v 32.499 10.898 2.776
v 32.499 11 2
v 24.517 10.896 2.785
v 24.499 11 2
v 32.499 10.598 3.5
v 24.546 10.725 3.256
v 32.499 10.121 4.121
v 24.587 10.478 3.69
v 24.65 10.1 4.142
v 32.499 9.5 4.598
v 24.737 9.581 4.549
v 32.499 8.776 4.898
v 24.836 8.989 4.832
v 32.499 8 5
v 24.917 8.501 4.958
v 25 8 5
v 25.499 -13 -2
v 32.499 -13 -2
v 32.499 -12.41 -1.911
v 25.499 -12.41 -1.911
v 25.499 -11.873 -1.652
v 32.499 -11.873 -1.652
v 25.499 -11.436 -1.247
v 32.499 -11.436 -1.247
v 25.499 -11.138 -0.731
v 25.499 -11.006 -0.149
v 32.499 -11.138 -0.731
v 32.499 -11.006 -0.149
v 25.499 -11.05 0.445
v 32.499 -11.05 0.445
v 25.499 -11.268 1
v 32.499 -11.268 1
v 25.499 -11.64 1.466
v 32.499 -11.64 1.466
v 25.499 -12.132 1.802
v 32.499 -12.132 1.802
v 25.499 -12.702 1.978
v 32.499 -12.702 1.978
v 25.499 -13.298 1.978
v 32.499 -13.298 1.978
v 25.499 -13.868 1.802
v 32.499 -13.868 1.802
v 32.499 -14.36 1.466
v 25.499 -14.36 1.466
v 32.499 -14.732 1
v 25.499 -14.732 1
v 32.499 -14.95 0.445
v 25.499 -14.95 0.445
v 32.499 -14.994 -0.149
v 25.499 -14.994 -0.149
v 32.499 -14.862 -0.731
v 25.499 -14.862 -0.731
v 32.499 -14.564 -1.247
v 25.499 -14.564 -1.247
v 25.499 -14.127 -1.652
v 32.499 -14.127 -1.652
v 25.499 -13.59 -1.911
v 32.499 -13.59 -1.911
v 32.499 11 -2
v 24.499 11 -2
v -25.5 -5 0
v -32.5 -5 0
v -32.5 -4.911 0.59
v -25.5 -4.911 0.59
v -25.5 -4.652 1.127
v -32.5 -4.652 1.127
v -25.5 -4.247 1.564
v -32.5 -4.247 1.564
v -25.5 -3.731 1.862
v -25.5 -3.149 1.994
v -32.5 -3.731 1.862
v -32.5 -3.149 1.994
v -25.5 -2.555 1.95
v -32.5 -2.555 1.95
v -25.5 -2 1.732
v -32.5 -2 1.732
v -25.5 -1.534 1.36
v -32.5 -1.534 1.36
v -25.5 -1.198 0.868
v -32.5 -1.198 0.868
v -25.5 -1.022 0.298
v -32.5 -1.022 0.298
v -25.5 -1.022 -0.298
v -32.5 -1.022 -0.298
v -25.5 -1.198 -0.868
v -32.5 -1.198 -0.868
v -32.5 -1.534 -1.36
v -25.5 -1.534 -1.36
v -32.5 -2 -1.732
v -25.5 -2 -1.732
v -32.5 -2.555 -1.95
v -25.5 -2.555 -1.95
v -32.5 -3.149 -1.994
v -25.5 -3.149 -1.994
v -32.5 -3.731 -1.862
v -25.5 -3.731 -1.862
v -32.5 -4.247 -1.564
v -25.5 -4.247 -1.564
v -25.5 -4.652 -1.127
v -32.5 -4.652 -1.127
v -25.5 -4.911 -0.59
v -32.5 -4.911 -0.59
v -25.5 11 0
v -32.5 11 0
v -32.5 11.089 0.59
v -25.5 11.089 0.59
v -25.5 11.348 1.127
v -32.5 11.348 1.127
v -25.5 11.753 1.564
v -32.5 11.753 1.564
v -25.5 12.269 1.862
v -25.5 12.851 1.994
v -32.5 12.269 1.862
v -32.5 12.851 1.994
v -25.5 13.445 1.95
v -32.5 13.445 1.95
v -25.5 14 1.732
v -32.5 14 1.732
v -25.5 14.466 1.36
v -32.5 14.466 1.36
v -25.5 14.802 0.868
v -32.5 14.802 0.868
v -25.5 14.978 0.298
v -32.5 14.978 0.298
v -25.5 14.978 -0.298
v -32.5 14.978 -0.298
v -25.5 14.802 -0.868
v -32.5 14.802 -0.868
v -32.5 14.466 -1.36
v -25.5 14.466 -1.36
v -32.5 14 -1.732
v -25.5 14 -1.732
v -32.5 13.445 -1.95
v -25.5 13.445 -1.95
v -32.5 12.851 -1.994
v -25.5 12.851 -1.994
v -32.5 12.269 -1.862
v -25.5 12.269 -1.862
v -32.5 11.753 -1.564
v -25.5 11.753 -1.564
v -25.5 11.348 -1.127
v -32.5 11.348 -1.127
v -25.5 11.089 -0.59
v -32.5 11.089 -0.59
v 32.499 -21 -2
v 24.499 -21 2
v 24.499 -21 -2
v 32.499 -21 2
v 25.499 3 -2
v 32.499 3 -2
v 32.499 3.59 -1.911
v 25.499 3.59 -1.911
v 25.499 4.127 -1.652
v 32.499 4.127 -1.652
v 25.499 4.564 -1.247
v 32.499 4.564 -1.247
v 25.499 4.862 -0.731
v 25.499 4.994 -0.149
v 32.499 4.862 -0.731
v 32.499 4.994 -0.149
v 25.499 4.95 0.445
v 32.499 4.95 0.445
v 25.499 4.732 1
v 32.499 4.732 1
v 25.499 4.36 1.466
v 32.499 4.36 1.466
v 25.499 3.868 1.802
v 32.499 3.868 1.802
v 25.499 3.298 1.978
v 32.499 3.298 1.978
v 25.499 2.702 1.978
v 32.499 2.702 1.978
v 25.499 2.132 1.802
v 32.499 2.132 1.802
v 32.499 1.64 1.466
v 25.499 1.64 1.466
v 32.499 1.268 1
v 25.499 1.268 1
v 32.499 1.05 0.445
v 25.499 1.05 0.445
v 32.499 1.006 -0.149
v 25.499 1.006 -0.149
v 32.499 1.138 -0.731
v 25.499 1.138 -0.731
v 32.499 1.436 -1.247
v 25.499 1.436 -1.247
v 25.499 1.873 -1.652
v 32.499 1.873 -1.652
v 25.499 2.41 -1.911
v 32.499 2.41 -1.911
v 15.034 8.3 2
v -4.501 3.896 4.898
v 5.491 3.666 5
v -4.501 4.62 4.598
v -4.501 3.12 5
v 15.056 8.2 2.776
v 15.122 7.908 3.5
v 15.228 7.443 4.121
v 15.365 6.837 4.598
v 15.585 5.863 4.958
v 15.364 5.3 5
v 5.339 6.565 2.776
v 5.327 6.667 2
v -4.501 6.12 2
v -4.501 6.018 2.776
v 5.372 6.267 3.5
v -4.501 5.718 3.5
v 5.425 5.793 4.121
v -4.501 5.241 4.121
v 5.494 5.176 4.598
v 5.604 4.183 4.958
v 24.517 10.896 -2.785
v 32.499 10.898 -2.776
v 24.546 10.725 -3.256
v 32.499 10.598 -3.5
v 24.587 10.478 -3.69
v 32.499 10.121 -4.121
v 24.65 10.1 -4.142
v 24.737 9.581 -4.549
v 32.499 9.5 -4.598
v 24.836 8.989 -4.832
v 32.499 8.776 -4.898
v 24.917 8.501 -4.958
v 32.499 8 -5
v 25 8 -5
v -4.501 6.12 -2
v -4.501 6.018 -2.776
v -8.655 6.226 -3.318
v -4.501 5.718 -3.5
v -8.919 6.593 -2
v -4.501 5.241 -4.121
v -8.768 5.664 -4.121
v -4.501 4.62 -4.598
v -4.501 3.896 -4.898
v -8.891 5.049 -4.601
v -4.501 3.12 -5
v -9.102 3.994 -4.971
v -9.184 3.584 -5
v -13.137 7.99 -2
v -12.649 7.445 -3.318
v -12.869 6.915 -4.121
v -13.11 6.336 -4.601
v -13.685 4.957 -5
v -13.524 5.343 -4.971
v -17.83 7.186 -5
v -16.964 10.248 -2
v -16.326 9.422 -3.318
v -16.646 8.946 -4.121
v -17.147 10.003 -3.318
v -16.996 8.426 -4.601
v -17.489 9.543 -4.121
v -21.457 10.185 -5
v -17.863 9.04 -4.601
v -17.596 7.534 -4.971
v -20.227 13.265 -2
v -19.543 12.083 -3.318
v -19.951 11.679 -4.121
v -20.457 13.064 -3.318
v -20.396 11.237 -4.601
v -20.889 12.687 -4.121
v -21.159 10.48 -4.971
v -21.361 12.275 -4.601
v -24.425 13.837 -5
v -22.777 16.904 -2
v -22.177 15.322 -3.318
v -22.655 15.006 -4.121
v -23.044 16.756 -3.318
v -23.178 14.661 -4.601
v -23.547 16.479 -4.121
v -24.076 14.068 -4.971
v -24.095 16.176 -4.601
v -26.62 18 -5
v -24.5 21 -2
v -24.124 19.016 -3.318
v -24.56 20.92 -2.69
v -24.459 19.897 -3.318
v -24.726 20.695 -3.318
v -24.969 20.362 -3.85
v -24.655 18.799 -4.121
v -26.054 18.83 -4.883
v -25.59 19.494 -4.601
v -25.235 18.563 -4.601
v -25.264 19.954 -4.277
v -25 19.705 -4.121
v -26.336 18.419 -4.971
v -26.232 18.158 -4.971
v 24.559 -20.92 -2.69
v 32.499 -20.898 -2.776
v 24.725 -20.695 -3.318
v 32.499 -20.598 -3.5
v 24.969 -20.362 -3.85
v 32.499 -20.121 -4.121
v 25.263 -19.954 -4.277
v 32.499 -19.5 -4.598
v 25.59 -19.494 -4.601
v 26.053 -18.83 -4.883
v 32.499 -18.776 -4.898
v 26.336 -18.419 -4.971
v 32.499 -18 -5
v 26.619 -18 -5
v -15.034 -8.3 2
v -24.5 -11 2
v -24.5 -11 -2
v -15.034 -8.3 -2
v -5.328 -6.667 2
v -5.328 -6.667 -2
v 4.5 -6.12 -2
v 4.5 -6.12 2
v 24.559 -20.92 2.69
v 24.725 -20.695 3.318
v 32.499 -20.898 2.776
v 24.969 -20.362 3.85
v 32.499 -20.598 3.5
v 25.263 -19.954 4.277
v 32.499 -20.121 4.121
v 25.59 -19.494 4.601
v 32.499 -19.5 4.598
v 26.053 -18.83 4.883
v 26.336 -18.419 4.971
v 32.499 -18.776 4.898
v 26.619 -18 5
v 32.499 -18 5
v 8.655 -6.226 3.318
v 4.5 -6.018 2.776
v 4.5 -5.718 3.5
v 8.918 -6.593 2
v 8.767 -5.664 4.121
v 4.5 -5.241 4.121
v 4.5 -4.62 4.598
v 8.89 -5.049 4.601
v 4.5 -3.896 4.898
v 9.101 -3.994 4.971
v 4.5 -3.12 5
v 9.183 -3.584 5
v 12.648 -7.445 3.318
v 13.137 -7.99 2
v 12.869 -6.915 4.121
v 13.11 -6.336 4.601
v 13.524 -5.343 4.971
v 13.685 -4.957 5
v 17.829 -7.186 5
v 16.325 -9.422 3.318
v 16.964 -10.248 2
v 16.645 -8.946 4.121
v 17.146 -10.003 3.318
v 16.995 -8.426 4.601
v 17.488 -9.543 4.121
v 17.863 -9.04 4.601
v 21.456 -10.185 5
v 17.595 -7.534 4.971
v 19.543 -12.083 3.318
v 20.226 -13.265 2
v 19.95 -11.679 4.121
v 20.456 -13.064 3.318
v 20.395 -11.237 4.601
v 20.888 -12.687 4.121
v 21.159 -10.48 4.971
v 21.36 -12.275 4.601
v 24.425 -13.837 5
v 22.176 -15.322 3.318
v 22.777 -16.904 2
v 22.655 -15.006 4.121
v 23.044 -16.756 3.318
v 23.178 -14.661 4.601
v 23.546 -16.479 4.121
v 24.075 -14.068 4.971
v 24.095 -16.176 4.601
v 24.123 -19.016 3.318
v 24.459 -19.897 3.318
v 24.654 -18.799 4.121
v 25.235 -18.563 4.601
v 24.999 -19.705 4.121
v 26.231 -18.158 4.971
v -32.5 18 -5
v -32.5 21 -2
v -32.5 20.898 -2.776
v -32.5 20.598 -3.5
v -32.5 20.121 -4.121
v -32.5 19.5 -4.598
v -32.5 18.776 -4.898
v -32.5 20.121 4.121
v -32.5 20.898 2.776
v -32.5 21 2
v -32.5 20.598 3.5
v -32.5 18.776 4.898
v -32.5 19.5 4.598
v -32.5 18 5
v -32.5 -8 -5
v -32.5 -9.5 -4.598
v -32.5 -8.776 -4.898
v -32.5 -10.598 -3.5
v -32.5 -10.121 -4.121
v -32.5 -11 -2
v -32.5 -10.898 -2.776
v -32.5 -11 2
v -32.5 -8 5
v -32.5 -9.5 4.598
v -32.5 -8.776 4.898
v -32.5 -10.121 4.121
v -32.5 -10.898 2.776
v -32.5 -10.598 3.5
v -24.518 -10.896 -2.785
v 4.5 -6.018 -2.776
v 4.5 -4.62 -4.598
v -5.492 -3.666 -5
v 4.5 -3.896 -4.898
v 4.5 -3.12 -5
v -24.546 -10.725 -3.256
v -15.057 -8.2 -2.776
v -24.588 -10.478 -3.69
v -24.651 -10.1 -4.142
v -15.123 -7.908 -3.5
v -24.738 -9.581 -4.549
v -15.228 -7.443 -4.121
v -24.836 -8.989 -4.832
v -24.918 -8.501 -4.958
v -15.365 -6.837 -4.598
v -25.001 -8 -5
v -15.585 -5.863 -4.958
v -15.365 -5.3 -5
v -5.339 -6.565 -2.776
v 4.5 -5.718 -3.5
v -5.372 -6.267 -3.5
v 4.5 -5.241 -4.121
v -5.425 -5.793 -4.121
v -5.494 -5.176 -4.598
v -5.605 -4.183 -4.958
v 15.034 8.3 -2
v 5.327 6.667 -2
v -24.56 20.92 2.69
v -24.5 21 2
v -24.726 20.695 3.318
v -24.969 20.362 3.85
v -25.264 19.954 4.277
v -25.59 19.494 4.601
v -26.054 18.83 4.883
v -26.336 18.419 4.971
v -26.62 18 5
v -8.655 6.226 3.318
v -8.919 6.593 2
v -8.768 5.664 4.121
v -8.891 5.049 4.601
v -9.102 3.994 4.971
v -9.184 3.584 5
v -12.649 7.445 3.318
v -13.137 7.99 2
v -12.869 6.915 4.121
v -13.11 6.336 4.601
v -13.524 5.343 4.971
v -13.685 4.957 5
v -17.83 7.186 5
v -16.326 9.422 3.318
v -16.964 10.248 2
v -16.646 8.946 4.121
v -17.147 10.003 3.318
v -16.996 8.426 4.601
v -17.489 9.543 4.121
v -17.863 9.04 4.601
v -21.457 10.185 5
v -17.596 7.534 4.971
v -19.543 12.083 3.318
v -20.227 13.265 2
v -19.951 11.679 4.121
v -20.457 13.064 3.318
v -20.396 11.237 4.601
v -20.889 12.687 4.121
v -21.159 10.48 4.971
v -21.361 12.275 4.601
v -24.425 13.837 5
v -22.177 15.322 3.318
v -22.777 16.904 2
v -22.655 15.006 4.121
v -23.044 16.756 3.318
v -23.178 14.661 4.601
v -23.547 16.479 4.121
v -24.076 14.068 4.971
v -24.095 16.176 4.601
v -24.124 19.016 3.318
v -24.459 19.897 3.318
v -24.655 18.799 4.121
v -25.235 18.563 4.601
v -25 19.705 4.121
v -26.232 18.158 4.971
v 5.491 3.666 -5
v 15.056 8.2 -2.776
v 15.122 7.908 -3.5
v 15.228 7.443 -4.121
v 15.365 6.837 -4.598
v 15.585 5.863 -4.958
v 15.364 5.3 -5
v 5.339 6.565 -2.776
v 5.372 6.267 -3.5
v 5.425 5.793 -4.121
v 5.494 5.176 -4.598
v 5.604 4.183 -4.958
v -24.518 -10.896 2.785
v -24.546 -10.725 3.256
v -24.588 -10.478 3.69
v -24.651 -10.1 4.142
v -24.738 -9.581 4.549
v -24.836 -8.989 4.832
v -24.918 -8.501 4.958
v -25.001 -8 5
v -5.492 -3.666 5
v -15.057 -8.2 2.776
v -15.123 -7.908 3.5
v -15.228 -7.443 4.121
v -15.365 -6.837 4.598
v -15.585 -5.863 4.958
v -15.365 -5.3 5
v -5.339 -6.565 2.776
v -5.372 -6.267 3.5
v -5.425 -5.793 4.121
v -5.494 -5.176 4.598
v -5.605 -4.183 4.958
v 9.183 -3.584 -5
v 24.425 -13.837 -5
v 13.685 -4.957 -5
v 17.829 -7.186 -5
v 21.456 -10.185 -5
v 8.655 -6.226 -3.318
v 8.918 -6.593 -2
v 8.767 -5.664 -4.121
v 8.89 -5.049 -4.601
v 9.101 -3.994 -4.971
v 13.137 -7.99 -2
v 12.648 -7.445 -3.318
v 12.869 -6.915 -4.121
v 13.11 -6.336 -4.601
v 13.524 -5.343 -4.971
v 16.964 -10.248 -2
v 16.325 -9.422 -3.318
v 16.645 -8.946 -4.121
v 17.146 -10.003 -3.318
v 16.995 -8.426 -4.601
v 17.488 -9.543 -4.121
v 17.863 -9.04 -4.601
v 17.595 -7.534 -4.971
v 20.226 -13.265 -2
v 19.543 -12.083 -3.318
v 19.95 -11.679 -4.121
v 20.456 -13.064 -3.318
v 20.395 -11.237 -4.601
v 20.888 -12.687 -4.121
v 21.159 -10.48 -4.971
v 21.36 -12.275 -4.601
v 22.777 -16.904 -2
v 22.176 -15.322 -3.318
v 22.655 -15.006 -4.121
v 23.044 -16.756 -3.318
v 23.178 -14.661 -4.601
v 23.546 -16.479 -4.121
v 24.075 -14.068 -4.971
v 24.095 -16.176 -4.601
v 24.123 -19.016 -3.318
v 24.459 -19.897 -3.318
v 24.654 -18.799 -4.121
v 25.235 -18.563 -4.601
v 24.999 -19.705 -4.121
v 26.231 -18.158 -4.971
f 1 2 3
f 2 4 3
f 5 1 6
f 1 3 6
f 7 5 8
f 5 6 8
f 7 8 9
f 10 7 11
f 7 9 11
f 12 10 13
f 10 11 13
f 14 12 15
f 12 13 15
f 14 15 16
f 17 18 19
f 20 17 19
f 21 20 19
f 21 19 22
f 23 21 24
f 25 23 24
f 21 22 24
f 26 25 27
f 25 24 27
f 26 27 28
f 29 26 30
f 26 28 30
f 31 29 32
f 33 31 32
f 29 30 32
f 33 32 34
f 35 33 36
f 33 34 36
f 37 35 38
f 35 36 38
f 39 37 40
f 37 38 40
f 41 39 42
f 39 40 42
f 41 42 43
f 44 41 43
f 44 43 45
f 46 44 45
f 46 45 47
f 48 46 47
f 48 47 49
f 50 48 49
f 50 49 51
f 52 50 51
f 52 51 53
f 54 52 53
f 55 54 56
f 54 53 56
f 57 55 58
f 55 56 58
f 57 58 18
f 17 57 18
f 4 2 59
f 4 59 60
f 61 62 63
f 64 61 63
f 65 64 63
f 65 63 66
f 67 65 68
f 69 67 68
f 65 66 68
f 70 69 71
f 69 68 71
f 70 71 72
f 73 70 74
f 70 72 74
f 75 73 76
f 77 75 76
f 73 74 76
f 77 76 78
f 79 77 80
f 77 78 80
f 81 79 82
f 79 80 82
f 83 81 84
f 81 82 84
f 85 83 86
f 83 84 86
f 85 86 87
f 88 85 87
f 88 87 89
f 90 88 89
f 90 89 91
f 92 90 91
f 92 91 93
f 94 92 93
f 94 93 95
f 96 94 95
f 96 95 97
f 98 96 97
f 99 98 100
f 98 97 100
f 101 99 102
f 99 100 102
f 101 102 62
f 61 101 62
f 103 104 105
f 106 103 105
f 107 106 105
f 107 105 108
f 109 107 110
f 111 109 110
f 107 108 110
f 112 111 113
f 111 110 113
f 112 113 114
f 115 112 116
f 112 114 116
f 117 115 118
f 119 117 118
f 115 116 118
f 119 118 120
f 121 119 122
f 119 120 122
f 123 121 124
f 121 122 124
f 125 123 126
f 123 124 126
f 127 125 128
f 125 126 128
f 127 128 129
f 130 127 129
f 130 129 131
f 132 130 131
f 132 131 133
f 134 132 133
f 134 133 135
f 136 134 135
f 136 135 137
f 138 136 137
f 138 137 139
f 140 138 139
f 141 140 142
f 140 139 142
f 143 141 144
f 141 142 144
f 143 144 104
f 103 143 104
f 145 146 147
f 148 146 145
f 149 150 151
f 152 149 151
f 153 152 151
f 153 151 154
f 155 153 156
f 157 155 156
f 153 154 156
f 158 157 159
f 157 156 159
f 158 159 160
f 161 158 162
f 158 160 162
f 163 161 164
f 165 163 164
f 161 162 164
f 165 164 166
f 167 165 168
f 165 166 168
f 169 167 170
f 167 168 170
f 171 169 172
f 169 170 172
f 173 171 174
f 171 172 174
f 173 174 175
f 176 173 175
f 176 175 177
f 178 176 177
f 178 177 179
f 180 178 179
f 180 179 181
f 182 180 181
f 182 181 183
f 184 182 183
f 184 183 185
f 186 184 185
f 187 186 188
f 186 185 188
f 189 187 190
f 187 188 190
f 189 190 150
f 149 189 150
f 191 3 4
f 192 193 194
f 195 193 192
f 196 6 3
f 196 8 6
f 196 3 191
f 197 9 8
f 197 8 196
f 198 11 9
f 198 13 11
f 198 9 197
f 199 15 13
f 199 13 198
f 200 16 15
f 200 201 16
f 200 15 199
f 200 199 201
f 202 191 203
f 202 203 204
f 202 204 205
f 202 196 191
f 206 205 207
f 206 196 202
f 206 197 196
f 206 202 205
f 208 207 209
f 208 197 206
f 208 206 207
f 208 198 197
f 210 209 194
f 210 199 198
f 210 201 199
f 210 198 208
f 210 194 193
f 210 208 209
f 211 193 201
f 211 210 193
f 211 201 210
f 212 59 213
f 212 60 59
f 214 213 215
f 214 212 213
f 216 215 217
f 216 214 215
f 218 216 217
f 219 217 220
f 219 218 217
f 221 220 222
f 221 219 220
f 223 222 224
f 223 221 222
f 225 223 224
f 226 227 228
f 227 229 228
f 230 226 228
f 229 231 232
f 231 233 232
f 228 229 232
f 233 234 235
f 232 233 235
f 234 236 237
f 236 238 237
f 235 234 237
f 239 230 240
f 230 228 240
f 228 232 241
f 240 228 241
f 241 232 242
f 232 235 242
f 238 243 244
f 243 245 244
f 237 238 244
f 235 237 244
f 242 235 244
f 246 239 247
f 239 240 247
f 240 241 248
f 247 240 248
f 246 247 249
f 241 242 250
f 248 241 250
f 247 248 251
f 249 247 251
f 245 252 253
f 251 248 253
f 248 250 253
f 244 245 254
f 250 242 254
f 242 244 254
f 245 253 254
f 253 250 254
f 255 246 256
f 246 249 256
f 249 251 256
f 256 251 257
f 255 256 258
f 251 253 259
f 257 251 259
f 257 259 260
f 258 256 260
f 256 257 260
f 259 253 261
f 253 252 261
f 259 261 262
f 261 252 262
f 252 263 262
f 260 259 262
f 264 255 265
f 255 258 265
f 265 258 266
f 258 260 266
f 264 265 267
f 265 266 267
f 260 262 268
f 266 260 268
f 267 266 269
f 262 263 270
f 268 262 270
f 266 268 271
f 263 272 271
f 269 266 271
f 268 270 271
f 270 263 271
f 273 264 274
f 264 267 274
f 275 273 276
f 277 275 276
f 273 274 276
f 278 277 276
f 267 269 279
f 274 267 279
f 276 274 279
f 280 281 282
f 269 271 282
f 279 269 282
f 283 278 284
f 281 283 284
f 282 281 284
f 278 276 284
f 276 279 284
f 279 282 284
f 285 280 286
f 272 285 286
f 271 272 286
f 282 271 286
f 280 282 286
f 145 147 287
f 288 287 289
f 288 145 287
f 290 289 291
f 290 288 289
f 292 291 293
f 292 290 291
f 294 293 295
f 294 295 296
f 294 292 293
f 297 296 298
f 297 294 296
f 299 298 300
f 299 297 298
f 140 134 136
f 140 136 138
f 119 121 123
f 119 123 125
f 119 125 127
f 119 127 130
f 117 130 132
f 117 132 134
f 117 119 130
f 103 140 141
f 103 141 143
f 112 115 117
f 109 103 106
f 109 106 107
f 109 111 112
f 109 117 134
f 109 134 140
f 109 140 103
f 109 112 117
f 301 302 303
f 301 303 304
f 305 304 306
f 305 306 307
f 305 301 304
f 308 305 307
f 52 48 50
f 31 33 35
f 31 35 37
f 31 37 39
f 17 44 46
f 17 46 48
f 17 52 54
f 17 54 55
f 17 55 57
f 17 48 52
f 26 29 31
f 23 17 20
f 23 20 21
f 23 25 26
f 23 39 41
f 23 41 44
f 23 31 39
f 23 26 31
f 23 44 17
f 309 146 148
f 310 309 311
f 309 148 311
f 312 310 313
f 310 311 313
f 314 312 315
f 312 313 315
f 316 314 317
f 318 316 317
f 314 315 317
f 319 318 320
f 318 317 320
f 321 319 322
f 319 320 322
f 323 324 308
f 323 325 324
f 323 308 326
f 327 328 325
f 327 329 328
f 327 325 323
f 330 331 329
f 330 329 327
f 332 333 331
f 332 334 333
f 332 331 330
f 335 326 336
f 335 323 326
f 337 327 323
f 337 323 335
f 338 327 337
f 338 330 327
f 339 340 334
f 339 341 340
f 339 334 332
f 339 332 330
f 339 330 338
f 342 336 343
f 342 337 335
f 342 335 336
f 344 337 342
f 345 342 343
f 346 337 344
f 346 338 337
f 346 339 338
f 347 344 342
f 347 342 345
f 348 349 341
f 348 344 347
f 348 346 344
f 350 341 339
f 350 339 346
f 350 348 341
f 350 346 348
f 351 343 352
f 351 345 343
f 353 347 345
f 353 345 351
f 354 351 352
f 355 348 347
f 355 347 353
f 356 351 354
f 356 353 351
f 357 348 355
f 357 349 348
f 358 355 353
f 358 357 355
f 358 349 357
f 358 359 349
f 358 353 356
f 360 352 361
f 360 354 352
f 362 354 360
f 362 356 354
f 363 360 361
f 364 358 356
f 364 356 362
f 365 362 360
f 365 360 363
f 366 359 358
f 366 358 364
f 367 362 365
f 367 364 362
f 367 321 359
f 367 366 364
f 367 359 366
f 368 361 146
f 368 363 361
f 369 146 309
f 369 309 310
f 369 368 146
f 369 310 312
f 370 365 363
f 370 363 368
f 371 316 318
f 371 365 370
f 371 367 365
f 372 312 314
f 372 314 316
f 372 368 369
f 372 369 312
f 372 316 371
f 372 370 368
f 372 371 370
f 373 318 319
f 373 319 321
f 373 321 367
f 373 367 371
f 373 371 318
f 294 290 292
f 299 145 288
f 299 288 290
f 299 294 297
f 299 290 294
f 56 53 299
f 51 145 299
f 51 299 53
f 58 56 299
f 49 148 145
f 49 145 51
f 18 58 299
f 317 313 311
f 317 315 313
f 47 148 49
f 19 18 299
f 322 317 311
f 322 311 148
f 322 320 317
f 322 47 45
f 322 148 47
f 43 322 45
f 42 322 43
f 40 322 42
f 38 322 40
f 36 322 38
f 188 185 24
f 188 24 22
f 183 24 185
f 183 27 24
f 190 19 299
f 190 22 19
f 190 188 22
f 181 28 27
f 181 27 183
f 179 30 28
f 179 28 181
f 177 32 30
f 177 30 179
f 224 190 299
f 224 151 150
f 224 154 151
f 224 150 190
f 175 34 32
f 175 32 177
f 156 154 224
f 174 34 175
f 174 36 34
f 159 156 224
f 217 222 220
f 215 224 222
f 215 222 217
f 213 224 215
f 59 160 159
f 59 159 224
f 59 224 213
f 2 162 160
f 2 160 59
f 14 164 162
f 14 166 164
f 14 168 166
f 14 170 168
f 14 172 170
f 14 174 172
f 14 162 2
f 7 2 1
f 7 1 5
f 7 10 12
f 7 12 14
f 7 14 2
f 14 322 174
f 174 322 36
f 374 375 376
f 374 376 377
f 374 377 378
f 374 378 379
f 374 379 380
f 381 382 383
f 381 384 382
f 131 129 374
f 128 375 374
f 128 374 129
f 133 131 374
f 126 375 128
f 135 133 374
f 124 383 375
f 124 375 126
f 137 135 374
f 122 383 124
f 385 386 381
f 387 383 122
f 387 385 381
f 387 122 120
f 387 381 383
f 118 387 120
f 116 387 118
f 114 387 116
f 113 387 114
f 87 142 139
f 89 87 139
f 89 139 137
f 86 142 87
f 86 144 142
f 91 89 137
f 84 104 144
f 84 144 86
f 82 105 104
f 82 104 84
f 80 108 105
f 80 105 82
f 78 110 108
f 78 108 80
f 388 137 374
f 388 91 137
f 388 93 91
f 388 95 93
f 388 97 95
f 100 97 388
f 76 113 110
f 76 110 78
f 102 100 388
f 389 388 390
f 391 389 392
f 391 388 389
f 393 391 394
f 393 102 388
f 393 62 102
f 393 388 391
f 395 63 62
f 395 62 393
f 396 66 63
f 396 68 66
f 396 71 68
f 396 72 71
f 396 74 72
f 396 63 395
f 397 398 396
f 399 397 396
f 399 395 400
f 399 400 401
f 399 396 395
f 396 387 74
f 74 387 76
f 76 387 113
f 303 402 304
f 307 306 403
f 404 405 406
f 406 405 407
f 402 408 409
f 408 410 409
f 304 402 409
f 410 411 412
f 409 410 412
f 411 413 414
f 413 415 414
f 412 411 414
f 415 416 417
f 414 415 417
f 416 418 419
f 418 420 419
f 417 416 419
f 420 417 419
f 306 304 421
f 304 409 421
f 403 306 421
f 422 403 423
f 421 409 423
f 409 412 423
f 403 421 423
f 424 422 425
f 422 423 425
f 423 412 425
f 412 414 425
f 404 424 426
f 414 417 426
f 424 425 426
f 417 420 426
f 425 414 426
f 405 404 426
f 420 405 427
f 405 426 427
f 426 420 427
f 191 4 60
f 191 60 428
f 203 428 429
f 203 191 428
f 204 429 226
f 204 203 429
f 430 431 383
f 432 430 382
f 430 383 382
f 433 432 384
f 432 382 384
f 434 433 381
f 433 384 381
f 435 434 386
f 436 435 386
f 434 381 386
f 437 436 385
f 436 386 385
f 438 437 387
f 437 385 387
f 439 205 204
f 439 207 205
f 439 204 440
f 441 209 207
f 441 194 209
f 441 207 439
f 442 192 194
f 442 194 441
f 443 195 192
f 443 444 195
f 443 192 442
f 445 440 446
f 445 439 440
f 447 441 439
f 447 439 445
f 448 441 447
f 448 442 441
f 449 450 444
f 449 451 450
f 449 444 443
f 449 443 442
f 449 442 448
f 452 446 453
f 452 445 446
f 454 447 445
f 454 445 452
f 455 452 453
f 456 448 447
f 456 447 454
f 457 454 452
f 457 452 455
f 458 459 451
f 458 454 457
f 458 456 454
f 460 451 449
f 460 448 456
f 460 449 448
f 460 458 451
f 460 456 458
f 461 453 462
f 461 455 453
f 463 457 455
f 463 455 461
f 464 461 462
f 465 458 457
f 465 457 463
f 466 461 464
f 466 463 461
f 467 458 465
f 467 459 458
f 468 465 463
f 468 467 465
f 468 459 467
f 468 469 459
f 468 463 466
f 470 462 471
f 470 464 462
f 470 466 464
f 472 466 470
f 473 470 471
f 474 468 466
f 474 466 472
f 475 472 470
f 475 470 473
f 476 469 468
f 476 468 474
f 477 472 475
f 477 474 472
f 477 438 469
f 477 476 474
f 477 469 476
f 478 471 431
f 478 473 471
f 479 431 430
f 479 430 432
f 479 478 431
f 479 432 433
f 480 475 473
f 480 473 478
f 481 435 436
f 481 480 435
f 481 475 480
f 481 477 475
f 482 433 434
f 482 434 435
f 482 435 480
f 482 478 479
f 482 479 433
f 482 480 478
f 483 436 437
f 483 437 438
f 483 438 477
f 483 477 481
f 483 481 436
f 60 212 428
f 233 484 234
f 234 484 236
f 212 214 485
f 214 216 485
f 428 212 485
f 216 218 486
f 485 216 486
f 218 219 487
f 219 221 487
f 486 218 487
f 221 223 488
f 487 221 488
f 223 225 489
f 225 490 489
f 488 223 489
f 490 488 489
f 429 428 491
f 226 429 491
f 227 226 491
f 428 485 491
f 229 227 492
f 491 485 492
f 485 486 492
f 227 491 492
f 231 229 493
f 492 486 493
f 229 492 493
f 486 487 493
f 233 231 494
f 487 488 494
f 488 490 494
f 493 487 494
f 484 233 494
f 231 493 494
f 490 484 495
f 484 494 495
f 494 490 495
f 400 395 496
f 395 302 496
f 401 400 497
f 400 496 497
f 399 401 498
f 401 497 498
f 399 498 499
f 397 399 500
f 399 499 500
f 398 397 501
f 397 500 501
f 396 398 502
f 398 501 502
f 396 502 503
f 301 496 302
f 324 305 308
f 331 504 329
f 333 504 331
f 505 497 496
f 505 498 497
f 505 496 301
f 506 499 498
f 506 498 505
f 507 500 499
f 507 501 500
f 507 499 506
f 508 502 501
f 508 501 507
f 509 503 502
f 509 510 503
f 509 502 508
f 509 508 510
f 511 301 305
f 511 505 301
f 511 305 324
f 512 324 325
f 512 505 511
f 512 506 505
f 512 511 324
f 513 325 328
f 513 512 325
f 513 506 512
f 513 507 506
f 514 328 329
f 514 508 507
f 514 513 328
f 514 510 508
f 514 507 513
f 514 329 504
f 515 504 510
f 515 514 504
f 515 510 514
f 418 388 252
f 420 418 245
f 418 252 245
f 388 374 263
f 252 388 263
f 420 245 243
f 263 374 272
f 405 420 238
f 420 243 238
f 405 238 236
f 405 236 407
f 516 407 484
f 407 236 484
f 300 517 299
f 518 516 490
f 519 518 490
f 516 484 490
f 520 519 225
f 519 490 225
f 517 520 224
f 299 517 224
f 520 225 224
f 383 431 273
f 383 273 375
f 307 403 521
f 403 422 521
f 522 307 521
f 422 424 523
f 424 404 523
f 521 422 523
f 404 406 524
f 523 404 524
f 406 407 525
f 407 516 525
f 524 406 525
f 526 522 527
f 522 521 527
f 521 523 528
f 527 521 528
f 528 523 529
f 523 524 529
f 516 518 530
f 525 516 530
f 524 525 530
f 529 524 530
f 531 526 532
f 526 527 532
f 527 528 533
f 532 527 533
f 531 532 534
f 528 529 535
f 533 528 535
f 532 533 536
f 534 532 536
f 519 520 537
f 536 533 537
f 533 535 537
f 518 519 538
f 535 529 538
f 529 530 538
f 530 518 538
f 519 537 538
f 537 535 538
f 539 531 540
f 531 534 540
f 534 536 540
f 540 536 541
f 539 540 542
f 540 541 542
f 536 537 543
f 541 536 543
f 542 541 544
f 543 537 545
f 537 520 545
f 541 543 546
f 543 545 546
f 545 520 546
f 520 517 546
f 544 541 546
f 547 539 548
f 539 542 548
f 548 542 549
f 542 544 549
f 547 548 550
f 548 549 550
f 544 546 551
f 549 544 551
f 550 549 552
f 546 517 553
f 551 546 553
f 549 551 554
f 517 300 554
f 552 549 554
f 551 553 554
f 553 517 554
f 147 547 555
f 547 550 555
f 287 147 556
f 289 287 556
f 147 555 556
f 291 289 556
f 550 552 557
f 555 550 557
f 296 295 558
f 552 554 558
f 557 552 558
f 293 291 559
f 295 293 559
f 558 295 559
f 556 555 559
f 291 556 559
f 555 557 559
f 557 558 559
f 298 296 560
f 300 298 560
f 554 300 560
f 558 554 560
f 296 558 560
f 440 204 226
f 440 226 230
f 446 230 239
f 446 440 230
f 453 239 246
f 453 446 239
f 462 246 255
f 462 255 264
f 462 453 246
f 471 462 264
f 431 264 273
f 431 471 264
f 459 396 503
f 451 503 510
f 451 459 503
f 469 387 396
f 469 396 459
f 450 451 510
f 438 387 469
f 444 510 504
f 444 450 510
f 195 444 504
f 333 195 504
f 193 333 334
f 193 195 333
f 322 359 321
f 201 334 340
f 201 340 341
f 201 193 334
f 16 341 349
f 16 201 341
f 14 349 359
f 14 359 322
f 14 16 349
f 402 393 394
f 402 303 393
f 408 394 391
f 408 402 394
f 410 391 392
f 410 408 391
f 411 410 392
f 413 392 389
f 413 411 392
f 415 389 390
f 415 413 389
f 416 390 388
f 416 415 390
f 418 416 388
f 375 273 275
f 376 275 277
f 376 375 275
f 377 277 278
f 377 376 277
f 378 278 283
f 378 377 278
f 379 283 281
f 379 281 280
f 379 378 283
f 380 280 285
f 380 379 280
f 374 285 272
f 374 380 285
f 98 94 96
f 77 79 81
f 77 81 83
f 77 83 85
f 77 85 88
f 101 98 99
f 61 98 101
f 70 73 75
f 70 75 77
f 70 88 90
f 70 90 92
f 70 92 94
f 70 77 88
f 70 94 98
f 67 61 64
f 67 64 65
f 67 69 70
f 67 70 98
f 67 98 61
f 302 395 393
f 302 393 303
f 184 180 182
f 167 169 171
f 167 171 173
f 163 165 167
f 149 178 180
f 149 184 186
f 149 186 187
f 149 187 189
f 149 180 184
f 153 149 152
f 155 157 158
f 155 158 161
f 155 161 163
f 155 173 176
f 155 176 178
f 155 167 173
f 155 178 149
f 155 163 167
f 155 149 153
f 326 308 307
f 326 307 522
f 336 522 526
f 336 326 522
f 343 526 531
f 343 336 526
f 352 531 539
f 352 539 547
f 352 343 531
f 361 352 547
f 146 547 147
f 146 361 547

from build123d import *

# Parameters (mm, degrees)
BOSS_EXTRUDE1_DEPTH = 5
FILLET1_R           = 3
SKETCH2_R           = 2
CUT_EXTRUDE1_DEPTH  = 7
SKETCH3_R           = 2
CUT_EXTRUDE2_DEPTH  = 7


with BuildPart() as part:
    # Sketch1 → Boss-Extrude1 (new, symmetric)
    with BuildSketch(Plane.XY):
        with BuildLine():
            Line((24.49935999, -21), (32.49935999, -21))
            Line((32.49935999, -21), (32.49935999, 11))
            Line((32.49935999, 11), (24.49935999, 11))
            ThreePointArc((24.49935999, 11), (10.203242171, 7.348405073), (-4.50064001, 6.12))
            ThreePointArc((-4.50064001, 6.12), (-16.964475696, 10.248068768), (-24.5, 21))
            Line((-24.5, 21), (-32.5, 21))
            Line((-32.5, 21), (-32.5, -11))
            Line((-32.5, -11), (-24.5, -11))
            ThreePointArc((-24.5, -11), (-10.203882181, -7.348405073), (4.5, -6.12))
            ThreePointArc((4.5, -6.12), (16.963835686, -10.248068768), (24.49935999, -21))
        make_face()
    extrude(amount=BOSS_EXTRUDE1_DEPTH, both=True)

    # Fillet1
    fillet1_edges = [part.edges().sort_by_distance(p)[0] for p in [
        (28.49935999, -21, -5),
        (16.963835686, -10.248068768, -5),
        (-10.203882181, -7.348405073, -5),
        (-28.5, -11, -5),
        (-28.5, 21, -5),
        (-16.964475696, 10.248068768, -5),
        (10.203242171, 7.348405073, 5),
        (10.203242171, 7.348405073, -5),
        (28.49935999, 11, -5),
        (-16.964475696, 10.248068768, 5),
        (-28.5, 21, 5),
        (-28.5, -11, 5),
        (-10.203882181, -7.348405073, 5),
        (16.963835686, -10.248068768, 5),
        (28.49935999, -21, 5),
        (28.49935999, 11, 5),
    ]]
    fillet(fillet1_edges, radius=FILLET1_R)

    # Sketch2 → Cut-Extrude1 (cut)
    with BuildSketch(Plane(origin=(32.49935999, 0, 0), x_dir=(0, 0, -1), z_dir=(1, 0, 0))):
        with Locations((0, -13)):
            Circle(SKETCH2_R)
        with Locations((0, 3)):
            Circle(SKETCH2_R)
    extrude(amount=-CUT_EXTRUDE1_DEPTH, mode=Mode.SUBTRACT)

    # Sketch3 → Cut-Extrude2 (cut)
    with BuildSketch(Plane.ZY.offset(32.5)):
        with Locations(Location((0, 13, 0), (0, 0, 270))):
            Circle(SKETCH3_R)
        with Locations(Location((0, -3, 0), (0, 0, 270))):
            Circle(SKETCH3_R)
    extrude(amount=-CUT_EXTRUDE2_DEPTH, mode=Mode.SUBTRACT)


solid = part.part
